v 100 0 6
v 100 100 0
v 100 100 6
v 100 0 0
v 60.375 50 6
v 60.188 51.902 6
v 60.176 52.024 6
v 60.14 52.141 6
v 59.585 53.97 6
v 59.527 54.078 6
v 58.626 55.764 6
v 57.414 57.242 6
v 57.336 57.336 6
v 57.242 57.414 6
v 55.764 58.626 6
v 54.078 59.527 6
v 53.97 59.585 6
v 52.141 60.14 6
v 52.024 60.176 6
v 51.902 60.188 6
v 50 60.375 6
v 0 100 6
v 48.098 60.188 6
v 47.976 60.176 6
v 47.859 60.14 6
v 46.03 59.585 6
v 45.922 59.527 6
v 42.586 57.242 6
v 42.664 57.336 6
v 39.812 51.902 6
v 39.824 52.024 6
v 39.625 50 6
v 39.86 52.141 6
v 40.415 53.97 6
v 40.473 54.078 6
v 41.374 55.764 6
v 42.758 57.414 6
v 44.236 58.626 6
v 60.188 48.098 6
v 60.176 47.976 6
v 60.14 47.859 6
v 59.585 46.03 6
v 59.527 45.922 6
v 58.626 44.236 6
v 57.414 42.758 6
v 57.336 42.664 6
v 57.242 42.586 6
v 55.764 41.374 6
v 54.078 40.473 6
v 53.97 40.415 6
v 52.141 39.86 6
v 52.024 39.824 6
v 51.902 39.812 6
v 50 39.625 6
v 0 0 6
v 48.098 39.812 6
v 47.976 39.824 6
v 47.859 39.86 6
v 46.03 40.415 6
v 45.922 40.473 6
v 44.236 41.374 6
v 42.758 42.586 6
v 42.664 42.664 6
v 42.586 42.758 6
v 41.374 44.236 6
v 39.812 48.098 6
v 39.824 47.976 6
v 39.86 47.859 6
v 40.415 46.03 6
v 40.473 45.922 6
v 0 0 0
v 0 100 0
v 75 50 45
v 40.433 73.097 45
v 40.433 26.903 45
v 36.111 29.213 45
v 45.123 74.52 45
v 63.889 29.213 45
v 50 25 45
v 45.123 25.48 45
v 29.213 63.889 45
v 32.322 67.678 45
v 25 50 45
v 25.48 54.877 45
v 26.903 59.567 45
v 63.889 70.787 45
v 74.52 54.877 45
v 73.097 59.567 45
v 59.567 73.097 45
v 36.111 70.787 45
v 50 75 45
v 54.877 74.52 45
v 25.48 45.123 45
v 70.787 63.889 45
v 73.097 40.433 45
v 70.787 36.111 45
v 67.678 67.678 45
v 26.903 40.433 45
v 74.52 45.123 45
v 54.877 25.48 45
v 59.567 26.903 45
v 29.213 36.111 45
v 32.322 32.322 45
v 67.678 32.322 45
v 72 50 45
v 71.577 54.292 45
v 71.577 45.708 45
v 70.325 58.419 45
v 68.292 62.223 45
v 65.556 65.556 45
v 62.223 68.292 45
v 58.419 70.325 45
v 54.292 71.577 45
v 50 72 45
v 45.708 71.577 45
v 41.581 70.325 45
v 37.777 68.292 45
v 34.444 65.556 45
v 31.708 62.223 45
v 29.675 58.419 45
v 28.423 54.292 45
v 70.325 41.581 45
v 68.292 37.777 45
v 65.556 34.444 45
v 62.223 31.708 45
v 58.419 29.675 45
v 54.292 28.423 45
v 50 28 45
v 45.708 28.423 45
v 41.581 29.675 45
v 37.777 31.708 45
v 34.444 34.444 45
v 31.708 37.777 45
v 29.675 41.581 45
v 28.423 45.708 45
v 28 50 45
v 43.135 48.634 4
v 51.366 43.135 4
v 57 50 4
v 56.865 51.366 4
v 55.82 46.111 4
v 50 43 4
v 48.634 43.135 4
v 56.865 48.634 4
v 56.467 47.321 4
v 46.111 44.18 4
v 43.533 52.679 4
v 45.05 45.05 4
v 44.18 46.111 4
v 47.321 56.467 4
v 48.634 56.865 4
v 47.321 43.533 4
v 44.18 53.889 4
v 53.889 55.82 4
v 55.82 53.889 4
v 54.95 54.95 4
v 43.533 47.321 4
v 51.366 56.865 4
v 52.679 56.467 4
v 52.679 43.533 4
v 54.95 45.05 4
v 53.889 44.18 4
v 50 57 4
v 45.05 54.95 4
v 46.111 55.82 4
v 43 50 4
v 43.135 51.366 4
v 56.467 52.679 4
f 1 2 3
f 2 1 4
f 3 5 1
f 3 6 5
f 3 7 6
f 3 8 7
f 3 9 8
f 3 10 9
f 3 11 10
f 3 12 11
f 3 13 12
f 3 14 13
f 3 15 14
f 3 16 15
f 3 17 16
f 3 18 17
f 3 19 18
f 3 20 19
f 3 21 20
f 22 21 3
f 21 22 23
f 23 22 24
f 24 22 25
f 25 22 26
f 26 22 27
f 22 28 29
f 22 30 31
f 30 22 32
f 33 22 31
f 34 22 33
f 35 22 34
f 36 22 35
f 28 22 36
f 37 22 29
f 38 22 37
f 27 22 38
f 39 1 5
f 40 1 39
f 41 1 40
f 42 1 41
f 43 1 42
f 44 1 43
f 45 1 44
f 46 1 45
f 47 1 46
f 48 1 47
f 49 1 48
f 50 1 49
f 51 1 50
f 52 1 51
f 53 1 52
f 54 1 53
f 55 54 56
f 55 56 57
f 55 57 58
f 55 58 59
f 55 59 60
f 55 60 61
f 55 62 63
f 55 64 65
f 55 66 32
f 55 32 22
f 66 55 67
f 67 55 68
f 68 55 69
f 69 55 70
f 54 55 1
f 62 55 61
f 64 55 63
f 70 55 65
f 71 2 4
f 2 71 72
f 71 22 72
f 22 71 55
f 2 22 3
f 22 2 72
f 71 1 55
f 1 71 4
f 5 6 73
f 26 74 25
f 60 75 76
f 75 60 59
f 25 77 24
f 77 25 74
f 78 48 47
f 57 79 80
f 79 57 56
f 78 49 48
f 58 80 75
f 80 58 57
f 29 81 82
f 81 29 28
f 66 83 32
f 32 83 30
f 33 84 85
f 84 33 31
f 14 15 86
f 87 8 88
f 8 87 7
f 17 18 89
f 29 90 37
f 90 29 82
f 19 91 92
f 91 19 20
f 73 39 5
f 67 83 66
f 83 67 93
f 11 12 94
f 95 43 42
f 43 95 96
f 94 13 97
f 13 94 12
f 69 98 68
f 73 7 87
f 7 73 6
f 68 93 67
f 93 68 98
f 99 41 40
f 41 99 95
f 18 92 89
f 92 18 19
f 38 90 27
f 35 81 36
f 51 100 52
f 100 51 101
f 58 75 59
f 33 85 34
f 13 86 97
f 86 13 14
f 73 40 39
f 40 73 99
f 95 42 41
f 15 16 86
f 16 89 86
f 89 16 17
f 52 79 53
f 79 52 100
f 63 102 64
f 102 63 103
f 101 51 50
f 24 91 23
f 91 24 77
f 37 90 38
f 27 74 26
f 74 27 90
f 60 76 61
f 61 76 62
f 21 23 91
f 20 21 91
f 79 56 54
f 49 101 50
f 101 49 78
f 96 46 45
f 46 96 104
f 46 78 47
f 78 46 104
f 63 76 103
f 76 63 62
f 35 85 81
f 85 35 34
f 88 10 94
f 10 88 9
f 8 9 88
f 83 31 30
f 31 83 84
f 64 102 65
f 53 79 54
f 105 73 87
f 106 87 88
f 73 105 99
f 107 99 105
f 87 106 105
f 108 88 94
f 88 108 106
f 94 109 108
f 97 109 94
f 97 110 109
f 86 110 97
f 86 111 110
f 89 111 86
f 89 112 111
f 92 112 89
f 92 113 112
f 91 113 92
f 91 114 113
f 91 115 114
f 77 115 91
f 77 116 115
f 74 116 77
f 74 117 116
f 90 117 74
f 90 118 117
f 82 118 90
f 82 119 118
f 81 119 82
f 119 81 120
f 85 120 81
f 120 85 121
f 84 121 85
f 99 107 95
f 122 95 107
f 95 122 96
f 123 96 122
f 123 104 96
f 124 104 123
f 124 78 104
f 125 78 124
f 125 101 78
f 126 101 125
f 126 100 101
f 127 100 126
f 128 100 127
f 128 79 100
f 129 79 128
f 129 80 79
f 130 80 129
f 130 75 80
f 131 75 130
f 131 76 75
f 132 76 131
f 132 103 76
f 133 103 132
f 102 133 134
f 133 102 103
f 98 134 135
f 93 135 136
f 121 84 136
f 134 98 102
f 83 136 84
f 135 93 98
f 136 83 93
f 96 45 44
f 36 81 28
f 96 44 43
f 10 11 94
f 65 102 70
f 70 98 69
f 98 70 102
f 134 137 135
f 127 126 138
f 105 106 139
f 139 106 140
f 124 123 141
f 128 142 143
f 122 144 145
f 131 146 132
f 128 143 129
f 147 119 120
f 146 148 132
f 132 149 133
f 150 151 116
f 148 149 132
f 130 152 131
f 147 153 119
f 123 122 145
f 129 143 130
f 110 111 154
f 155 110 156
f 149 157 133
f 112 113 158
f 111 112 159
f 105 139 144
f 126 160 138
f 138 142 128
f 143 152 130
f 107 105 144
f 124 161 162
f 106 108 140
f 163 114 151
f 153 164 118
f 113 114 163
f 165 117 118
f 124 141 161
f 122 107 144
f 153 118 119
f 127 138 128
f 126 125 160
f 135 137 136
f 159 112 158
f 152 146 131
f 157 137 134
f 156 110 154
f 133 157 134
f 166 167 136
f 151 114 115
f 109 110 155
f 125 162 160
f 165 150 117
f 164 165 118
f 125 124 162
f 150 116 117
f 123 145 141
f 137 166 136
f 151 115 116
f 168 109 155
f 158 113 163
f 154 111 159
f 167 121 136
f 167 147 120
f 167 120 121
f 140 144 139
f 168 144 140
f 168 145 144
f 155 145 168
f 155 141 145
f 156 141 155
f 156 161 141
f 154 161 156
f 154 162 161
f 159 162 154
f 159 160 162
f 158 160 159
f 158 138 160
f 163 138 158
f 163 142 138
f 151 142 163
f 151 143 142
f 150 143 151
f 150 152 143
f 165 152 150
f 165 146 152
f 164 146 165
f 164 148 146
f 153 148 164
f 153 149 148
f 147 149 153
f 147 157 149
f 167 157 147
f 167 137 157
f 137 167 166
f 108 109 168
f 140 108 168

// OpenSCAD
$fn = 32;

// ----------------------------------------------------------------------
// Hopper: funnel with square flange
// ----------------------------------------------------------------------

// --- parameters (mm) ---
fl = 100;                 // flange side, X and Y
fl_t = 6;                 // flange thickness
cone_h = 40;              // cone height above the flange
top_d = 50;               // cone mouth diameter
bot_d = 20;               // cone spout diameter
wall = 3;                 // cone wall thickness

bore_d = bot_d - 2 * wall;  // spout bore diameter
total_h = fl_t + cone_h - 1;  // overall height

difference() {
  union() {
    cube([fl, fl, fl_t]);
    translate([fl / 2, fl / 2, fl_t - 1])
      cylinder(h = cone_h, d1 = bot_d, d2 = top_d);
  }
  translate([fl / 2, fl / 2, fl_t - 2])
    cylinder(h = cone_h + 1, d1 = bore_d, d2 = top_d - 2 * wall);
}
